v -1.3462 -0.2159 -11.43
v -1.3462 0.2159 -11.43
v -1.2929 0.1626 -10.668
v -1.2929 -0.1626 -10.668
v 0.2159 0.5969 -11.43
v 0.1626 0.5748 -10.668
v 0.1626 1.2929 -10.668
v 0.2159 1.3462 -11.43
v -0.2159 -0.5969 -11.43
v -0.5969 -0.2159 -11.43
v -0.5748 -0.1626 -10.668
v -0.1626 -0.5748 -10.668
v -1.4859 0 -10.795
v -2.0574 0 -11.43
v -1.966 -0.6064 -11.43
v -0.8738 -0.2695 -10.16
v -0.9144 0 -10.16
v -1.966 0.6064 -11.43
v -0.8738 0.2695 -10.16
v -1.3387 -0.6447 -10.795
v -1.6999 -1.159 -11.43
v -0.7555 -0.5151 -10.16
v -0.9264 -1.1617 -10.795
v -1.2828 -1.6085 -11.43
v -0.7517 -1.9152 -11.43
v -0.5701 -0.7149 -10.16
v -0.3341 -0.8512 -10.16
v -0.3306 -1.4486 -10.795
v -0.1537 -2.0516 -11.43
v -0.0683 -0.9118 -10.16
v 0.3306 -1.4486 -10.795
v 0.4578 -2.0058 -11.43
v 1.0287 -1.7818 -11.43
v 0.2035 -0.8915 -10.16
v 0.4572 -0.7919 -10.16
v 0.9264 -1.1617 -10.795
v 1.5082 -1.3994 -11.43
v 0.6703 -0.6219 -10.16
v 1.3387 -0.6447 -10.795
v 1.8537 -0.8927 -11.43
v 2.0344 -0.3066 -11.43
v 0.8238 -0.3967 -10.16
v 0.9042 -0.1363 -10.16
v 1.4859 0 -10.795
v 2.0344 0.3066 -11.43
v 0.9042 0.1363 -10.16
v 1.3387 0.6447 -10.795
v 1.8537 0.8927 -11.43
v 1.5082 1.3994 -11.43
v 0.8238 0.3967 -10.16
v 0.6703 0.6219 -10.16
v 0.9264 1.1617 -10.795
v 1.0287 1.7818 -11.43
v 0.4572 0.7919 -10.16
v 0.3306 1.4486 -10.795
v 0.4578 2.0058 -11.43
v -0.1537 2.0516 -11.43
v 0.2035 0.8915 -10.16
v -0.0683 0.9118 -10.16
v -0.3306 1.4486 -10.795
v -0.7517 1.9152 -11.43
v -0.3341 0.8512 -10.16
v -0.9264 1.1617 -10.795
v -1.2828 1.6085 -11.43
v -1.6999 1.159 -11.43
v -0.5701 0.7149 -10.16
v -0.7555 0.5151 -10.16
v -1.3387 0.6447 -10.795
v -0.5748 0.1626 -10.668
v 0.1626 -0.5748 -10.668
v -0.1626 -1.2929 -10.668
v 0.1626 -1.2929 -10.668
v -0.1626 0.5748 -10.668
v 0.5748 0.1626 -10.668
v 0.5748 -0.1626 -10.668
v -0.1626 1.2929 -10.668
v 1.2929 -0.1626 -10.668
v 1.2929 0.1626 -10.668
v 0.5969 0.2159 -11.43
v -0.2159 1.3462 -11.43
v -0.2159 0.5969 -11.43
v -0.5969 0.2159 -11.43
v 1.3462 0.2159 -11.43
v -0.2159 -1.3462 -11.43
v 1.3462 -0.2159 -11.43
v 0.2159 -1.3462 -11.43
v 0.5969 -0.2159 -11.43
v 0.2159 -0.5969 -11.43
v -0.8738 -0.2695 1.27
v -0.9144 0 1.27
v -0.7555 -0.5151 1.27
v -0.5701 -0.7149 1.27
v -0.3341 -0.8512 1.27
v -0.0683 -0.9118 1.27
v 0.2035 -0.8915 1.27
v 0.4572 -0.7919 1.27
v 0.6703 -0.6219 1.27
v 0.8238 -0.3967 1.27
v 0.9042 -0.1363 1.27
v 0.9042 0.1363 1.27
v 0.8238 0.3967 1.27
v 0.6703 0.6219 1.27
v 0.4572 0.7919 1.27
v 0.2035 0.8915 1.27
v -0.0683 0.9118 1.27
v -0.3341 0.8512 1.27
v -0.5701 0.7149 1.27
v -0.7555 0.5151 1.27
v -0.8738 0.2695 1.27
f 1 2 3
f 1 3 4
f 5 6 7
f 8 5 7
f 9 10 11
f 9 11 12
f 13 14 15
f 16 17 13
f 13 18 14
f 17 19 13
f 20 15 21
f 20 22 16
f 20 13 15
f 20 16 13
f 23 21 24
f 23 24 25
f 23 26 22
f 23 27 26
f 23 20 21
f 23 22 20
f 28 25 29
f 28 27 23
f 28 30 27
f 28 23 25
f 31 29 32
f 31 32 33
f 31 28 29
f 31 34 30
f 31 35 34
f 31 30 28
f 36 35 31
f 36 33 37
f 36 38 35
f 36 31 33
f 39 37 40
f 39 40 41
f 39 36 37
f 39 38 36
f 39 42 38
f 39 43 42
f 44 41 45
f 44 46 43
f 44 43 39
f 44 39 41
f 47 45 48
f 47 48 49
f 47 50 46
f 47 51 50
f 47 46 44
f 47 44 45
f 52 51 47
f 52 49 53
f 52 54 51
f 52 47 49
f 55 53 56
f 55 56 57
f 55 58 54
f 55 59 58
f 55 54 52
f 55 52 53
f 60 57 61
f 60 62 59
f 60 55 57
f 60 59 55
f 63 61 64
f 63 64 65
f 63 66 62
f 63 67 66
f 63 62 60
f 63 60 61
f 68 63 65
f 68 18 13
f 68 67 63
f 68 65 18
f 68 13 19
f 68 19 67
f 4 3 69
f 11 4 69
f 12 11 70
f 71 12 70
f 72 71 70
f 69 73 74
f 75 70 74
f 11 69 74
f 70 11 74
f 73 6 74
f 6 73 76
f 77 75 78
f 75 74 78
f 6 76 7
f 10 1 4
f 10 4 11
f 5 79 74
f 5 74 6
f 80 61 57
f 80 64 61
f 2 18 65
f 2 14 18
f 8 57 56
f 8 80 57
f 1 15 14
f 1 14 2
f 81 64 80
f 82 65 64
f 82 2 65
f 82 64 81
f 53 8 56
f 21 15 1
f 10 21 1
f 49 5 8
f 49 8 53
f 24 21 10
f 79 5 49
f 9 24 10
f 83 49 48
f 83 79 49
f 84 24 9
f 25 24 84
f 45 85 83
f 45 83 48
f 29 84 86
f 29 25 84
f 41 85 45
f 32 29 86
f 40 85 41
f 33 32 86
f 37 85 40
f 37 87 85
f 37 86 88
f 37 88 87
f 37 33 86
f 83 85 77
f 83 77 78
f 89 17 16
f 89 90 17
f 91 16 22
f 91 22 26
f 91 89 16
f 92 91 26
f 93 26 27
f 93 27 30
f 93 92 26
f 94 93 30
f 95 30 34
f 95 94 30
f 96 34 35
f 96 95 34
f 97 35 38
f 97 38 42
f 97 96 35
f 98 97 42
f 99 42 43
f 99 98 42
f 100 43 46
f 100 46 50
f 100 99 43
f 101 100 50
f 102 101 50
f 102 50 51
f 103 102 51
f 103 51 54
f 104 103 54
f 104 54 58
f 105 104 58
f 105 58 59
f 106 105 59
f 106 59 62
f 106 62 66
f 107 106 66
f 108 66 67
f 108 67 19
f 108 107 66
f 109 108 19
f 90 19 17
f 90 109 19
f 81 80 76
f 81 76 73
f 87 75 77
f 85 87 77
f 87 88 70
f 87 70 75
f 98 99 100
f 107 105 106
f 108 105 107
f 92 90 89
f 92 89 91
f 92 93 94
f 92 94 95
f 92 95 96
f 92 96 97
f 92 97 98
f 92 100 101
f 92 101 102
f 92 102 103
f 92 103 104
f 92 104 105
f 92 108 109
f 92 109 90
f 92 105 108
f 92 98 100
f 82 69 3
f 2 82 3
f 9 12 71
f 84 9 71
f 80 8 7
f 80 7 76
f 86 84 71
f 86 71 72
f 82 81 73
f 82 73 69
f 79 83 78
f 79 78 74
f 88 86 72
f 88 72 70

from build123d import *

# Parameters (mm, degrees)
H1_CROSSRECESS_4DEG_DEPTH = 0.762
H1_CROSSRECESS_4DEG_DRAFT = 4


with BuildPart() as part:
    # H1_SK_profile → H1_Body (revolve)
    with BuildSketch(Plane(origin=(0, 0, 0), x_dir=(0, 0, -1), z_dir=(1, 0, 0)), mode=Mode.PRIVATE) as h1_body_sk:
        Polygon((11.43, 0), (11.43, 2.0574), (10.16, 0.9144), (-1.27, 0.9144), (-1.27, 0), align=None)
    revolve(h1_body_sk.sketch.rotate(Axis((0, 0, -15.24), (0, 0, 1)), 90), axis=Axis((0, 0, -15.24), (0, 0, 1)))


with BuildPart() as h1_crossrecess_4deg_tool:
    # H1_SK_crossRecess → H1_CrossRecess_4deg (with draft: the straight prism first)
    with BuildSketch(Plane.XY.offset(-11.43)):
        Polygon((1.3462, -0.2159), (1.3462, 0.2159), (0.5969, 0.2159), (0.2159, 0.5969), (0.2159, 1.3462), (-0.2159, 1.3462), (-0.2159, 0.5969), (-0.5969, 0.2159), (-1.3462, 0.2159), (-1.3462, -0.2159), (-0.5969, -0.2159), (-0.2159, -0.5969), (-0.2159, -1.3462), (0.2159, -1.3462), (0.2159, -0.5969), (0.5969, -0.2159), align=None)
    extrude(amount=H1_CROSSRECESS_4DEG_DEPTH)
    # H1_CrossRecess_4deg: the draft: its side faces are tilted about the plane it starts from
    h1_crossrecess_4deg_sides = [h1_crossrecess_4deg_tool.faces().sort_by_distance(p)[0] for p in [
        (1.3462, 0, -11.049),
        (0.97155, 0.2159, -11.049),
        (0.4064, 0.4064, -11.049),
        (0.2159, 0.97155, -11.049),
        (0, 1.3462, -11.049),
        (-0.2159, 0.97155, -11.049),
        (-0.4064, 0.4064, -11.049),
        (-0.97155, 0.2159, -11.049),
        (-1.3462, 0, -11.049),
        (-0.97155, -0.2159, -11.049),
        (-0.4064, -0.4064, -11.049),
        (-0.2159, -0.97155, -11.049),
        (0, -1.3462, -11.049),
        (0.2159, -0.97155, -11.049),
        (0.4064, -0.4064, -11.049),
        (0.97155, -0.2159, -11.049),
    ]]
    draft(h1_crossrecess_4deg_sides, Plane.XY.offset(-11.43), H1_CROSSRECESS_4DEG_DRAFT)


with BuildPart() as part_1:
    add(part.part)

    # H1_CrossRecess_4deg: cut by h1_crossrecess_4deg_tool
    add(h1_crossrecess_4deg_tool.part, mode=Mode.SUBTRACT)


solid = part_1.part
